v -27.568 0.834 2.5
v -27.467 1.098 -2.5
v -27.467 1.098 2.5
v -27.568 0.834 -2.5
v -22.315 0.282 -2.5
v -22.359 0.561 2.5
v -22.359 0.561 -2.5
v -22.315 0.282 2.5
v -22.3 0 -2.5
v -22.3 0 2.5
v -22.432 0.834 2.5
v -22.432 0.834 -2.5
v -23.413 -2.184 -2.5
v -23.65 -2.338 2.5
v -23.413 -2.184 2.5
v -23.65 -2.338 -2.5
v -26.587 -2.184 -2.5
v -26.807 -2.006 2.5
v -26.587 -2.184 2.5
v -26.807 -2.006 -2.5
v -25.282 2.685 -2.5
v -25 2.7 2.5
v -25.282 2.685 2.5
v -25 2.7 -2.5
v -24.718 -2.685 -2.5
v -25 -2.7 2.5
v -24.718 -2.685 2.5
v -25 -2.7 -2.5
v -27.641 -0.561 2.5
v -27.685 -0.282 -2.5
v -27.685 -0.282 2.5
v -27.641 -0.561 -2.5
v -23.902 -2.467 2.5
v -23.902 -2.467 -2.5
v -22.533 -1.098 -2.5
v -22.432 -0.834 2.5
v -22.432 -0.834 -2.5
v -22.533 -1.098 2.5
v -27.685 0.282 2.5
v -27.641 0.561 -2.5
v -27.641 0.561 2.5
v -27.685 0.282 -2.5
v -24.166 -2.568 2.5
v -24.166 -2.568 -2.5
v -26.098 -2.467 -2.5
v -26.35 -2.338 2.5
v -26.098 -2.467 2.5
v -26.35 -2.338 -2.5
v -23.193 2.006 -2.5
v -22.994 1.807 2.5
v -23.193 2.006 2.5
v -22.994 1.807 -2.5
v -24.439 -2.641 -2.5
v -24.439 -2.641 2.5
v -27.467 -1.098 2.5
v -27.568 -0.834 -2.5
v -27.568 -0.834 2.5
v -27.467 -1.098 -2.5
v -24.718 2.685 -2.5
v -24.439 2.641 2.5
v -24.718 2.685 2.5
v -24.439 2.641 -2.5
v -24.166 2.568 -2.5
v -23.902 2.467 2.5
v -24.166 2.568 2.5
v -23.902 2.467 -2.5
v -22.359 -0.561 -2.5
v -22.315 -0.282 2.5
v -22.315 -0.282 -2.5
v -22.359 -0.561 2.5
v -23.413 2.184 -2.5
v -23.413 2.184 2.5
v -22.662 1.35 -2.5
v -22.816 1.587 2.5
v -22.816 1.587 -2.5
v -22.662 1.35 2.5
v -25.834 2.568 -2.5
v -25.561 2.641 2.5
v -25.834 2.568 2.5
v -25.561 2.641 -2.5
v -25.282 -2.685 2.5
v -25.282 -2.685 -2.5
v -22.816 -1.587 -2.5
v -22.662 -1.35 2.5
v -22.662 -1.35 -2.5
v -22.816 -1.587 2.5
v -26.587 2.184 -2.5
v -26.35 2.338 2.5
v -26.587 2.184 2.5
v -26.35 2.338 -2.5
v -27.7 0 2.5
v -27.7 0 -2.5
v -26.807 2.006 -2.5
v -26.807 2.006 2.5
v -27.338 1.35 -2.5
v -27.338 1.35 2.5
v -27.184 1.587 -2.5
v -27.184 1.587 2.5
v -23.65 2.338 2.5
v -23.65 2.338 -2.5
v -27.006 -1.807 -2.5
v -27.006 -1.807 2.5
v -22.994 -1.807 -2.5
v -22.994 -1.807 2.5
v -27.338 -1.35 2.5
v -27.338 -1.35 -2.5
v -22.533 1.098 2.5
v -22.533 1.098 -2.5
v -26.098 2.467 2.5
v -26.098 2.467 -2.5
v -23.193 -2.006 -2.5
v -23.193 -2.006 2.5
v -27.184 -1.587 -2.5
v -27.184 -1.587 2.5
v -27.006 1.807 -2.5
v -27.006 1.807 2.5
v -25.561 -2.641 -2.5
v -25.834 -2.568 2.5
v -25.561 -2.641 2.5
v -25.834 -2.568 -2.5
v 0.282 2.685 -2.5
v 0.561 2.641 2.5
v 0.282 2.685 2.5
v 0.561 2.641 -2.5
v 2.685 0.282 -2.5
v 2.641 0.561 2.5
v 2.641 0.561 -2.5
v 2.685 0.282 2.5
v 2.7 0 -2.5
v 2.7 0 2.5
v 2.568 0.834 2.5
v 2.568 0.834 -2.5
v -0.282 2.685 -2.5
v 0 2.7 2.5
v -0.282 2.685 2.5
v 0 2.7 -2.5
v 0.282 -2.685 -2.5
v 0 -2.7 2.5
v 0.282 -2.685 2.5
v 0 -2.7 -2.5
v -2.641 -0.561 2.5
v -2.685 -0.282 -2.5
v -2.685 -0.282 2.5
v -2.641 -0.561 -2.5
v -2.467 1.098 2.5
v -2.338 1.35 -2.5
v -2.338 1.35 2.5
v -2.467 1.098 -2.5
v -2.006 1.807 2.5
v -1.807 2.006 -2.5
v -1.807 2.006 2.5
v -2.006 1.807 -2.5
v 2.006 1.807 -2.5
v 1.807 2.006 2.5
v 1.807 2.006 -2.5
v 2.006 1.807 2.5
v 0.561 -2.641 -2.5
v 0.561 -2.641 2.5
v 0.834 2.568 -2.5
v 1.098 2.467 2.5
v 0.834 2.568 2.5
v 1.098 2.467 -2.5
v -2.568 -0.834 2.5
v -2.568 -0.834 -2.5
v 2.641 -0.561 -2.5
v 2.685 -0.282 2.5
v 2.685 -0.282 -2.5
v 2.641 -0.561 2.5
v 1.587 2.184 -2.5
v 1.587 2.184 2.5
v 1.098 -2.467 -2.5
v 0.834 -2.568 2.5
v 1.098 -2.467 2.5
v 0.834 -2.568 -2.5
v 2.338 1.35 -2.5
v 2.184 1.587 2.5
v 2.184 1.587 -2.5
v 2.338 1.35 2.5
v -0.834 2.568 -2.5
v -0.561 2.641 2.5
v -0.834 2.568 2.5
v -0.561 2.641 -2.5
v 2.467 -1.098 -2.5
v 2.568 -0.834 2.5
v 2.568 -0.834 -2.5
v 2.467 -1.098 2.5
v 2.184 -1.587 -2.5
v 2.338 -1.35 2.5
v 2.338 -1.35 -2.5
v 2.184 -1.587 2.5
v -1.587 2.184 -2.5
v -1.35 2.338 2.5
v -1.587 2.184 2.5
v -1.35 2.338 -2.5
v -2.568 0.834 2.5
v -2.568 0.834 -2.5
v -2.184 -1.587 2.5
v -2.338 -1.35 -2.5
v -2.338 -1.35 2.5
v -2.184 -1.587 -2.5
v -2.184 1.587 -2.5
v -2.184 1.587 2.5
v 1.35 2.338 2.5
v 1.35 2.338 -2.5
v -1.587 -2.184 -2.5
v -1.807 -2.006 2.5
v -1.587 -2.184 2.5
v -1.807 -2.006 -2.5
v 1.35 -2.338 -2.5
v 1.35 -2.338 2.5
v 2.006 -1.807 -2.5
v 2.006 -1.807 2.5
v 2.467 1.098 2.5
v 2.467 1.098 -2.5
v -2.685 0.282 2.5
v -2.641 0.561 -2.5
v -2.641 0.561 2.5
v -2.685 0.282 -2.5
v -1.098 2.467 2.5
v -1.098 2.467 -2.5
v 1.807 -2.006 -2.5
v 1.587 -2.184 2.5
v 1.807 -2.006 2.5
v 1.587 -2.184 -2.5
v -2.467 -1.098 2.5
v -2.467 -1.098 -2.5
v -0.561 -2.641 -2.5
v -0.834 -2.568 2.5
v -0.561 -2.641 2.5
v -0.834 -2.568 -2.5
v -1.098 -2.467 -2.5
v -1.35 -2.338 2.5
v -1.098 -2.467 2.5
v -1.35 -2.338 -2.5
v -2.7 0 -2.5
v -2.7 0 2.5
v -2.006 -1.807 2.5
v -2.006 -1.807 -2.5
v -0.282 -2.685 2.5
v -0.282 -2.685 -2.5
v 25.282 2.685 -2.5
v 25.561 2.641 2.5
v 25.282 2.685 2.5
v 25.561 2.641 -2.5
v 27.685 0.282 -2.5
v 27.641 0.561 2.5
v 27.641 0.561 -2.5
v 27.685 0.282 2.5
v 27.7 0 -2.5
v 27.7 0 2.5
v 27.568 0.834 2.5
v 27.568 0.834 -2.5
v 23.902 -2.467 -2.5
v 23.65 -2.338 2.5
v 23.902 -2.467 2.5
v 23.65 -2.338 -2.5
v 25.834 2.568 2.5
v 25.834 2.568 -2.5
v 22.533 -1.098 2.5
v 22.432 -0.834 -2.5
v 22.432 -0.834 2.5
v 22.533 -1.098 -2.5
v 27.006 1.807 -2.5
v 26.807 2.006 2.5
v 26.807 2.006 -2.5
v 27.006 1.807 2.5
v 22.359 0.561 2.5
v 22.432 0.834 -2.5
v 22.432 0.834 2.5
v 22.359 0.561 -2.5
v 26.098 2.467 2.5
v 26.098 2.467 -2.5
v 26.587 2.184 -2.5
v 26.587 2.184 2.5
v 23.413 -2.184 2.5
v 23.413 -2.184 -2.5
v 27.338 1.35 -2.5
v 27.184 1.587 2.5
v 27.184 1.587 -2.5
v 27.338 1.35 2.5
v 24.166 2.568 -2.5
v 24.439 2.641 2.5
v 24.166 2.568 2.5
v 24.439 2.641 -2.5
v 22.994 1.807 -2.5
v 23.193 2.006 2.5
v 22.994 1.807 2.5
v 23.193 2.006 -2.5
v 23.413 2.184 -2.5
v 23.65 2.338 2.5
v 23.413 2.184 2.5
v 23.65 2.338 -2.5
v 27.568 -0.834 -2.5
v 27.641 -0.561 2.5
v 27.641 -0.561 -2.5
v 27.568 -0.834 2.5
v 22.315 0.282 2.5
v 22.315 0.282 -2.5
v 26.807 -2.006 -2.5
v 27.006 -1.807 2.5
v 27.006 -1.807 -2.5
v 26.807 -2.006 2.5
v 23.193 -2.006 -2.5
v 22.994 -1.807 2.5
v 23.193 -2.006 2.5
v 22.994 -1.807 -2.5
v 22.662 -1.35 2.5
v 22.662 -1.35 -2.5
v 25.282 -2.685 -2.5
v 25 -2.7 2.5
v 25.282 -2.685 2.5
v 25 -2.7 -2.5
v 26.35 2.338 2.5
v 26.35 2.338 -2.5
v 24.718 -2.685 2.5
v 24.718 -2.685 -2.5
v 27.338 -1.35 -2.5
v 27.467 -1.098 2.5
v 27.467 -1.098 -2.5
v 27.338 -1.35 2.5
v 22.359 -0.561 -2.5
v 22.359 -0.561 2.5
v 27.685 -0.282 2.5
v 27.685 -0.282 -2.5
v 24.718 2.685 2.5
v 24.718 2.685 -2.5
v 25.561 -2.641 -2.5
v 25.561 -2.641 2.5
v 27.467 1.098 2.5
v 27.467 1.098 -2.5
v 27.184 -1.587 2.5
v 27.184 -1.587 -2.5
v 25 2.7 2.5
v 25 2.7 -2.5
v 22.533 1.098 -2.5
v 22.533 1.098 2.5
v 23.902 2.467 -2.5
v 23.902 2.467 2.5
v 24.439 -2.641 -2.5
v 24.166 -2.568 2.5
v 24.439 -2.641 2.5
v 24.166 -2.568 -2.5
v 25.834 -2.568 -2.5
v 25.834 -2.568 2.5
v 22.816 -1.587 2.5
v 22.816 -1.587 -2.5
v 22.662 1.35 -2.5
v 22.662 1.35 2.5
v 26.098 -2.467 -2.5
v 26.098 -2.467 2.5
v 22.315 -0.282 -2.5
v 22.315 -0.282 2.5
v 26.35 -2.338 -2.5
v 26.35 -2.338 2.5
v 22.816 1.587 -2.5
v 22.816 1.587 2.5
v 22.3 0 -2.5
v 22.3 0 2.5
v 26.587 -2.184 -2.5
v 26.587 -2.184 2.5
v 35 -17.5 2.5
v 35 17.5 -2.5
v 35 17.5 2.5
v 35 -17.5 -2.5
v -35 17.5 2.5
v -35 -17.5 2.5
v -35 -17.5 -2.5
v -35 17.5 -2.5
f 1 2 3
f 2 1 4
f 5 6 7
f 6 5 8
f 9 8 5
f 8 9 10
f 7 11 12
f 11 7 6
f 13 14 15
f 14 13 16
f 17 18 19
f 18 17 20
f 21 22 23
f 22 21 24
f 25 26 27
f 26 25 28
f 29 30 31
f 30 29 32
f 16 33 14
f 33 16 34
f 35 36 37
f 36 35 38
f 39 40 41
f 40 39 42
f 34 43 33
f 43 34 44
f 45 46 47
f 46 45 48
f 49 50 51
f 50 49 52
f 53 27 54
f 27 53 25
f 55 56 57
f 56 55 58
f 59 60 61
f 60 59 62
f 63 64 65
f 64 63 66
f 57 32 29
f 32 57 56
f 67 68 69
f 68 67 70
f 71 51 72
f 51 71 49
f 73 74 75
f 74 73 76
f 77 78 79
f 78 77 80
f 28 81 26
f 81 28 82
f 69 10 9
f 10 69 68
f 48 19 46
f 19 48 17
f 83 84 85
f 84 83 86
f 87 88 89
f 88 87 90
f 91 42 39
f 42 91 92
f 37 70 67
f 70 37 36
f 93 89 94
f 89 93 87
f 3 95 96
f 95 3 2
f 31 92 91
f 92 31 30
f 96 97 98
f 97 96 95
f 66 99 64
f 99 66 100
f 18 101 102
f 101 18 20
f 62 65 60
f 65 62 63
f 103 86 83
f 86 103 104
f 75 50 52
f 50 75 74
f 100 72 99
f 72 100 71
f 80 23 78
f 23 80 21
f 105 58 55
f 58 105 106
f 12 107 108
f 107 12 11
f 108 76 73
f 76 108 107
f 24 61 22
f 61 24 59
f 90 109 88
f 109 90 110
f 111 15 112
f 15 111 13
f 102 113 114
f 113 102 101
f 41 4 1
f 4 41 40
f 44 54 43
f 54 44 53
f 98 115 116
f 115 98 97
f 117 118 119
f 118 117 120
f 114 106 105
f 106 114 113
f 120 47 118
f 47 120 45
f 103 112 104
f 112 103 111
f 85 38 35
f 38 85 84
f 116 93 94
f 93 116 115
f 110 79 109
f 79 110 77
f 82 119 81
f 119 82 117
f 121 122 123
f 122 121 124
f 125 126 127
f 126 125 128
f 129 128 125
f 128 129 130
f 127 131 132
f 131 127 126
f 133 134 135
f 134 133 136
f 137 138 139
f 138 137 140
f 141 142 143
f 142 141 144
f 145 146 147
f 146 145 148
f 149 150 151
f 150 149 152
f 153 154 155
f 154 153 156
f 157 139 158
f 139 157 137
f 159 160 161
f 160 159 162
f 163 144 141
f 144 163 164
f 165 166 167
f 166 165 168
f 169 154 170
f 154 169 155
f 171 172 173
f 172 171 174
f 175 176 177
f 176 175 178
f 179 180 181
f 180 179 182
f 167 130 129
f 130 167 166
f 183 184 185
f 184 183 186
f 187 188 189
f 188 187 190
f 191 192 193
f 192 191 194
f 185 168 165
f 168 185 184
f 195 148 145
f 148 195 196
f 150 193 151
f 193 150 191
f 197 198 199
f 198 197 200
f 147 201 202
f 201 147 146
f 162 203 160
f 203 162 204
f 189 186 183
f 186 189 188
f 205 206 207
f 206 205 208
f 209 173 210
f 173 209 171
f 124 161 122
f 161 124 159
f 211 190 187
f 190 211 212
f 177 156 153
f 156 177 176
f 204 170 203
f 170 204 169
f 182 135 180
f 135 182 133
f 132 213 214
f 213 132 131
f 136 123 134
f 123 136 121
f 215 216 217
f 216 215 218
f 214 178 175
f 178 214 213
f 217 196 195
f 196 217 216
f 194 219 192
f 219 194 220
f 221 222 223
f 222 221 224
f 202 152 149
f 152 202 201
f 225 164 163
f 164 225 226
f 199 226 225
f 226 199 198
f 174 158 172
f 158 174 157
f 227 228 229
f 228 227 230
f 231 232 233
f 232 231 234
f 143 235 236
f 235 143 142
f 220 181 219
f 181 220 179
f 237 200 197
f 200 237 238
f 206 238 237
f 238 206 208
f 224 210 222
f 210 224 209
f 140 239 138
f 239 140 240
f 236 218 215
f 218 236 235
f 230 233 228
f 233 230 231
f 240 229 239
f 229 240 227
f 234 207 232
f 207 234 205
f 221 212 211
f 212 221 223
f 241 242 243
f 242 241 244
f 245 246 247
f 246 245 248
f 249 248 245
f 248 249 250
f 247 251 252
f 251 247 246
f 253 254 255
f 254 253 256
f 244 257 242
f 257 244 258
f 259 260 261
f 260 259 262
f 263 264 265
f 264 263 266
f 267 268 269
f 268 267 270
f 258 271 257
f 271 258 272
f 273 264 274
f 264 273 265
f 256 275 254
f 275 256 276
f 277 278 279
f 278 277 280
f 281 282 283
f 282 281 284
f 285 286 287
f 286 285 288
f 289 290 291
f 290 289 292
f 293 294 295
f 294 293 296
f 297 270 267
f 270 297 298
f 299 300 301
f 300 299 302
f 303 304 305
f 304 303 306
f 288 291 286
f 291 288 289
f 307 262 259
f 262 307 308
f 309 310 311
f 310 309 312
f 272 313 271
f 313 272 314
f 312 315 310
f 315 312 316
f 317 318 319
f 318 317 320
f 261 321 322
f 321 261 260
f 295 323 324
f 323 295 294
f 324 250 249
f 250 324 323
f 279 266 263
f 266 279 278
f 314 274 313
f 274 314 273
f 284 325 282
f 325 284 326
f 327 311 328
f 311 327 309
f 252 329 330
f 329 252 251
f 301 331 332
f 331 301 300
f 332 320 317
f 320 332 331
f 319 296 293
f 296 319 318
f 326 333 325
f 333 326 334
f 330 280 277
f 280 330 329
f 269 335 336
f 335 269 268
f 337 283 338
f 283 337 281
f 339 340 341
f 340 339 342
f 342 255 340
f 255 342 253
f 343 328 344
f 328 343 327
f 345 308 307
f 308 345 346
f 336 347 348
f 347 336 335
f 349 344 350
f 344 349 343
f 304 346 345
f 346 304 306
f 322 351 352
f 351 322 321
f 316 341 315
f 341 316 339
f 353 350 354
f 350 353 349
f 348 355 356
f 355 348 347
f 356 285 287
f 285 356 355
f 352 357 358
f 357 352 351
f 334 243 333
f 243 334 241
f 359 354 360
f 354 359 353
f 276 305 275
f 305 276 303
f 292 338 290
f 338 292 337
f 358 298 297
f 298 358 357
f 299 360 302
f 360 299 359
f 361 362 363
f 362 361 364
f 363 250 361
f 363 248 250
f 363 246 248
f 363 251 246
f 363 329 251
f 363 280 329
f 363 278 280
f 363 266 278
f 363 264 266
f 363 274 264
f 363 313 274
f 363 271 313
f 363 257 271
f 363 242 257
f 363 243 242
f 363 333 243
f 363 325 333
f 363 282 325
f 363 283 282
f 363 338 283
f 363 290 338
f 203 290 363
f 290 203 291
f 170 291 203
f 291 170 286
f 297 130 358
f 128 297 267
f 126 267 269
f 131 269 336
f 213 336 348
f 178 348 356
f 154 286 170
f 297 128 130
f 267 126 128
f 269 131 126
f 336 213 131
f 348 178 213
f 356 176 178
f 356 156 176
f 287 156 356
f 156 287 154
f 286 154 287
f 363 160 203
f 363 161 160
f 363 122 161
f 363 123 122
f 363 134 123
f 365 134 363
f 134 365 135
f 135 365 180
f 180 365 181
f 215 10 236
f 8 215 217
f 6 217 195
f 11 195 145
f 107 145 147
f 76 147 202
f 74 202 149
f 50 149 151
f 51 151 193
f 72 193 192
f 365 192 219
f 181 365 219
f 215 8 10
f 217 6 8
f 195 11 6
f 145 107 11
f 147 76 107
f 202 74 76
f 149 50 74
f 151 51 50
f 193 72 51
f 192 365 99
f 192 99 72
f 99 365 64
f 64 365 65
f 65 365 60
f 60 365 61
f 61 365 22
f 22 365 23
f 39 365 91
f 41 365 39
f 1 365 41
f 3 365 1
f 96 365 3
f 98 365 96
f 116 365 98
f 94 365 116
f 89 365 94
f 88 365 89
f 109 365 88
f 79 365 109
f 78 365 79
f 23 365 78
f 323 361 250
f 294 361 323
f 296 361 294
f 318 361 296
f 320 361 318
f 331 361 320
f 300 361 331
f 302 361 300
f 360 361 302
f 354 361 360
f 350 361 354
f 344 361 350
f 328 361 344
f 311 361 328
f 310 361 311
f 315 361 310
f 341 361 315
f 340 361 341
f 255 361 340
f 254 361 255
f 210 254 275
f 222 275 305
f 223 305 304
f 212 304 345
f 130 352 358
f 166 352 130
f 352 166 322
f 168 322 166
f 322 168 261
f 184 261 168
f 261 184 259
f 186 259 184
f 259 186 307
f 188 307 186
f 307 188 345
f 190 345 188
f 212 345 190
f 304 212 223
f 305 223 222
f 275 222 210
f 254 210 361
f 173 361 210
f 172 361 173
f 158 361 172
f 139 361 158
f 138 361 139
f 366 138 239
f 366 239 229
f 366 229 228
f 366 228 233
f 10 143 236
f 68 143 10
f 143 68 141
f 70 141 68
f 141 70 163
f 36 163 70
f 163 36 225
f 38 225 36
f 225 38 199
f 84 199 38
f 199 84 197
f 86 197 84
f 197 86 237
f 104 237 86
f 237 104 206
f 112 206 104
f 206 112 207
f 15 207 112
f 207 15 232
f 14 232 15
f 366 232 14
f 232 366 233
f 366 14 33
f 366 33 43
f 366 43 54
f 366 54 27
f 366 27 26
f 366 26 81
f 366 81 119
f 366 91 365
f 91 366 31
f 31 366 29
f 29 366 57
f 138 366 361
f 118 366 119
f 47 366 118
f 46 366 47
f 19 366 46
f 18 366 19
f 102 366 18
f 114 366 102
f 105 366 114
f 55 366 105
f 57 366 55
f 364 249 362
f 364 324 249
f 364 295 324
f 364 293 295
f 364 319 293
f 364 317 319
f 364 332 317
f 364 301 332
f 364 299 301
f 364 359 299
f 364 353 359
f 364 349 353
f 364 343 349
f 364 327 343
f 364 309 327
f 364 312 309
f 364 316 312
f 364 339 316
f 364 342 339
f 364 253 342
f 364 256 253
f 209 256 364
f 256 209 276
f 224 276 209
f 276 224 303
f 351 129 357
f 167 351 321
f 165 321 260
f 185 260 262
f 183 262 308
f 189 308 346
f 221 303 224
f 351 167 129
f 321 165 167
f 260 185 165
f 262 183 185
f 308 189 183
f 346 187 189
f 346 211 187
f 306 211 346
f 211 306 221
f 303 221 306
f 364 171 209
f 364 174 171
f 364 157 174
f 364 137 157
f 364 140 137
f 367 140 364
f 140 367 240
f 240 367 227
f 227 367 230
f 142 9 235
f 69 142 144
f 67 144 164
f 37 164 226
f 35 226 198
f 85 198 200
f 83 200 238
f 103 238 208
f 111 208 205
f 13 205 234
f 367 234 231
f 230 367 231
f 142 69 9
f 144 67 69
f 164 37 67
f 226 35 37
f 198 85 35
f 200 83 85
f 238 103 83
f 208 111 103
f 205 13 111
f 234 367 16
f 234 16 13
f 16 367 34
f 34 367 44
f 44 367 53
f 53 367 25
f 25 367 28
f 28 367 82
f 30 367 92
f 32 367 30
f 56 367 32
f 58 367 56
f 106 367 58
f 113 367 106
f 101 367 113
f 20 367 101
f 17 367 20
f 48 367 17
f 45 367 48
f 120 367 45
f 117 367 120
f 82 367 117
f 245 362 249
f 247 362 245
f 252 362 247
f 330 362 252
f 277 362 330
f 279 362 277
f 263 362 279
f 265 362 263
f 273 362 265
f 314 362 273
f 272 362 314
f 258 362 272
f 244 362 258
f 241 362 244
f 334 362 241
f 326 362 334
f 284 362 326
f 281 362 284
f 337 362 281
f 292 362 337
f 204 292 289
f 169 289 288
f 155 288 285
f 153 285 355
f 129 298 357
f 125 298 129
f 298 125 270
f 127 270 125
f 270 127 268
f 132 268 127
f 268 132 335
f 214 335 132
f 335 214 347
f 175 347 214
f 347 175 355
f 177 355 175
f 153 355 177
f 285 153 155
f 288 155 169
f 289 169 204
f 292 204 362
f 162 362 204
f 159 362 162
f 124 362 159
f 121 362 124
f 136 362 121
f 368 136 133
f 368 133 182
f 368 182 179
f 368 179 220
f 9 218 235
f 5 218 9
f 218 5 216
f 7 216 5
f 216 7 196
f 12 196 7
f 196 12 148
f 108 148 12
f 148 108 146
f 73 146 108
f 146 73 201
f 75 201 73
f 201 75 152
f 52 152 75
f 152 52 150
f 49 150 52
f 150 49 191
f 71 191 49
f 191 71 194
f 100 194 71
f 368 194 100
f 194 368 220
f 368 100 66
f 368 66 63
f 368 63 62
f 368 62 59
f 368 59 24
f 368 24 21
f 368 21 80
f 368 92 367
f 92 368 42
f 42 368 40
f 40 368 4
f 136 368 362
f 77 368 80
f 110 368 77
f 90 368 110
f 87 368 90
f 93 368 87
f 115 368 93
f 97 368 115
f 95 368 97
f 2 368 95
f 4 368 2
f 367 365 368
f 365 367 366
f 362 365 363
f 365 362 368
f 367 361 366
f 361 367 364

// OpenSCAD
// Multi-hole mounting plate.
$fn = 60;
eps = 0.02;
plate_l = 70;
plate_w = 35;
plate_t = 5;
hole_d = 5.4;
edge = 10;
difference() {
    cube([plate_l, plate_w, plate_t], center = true);
    for (i = [0 : 2])
        translate([-plate_l / 2 + edge + i * (plate_l - 2 * edge) / max(1, 2), 0, -plate_t / 2 - eps])
            cylinder(d = hole_d, h = plate_t + 2 * eps);
}
